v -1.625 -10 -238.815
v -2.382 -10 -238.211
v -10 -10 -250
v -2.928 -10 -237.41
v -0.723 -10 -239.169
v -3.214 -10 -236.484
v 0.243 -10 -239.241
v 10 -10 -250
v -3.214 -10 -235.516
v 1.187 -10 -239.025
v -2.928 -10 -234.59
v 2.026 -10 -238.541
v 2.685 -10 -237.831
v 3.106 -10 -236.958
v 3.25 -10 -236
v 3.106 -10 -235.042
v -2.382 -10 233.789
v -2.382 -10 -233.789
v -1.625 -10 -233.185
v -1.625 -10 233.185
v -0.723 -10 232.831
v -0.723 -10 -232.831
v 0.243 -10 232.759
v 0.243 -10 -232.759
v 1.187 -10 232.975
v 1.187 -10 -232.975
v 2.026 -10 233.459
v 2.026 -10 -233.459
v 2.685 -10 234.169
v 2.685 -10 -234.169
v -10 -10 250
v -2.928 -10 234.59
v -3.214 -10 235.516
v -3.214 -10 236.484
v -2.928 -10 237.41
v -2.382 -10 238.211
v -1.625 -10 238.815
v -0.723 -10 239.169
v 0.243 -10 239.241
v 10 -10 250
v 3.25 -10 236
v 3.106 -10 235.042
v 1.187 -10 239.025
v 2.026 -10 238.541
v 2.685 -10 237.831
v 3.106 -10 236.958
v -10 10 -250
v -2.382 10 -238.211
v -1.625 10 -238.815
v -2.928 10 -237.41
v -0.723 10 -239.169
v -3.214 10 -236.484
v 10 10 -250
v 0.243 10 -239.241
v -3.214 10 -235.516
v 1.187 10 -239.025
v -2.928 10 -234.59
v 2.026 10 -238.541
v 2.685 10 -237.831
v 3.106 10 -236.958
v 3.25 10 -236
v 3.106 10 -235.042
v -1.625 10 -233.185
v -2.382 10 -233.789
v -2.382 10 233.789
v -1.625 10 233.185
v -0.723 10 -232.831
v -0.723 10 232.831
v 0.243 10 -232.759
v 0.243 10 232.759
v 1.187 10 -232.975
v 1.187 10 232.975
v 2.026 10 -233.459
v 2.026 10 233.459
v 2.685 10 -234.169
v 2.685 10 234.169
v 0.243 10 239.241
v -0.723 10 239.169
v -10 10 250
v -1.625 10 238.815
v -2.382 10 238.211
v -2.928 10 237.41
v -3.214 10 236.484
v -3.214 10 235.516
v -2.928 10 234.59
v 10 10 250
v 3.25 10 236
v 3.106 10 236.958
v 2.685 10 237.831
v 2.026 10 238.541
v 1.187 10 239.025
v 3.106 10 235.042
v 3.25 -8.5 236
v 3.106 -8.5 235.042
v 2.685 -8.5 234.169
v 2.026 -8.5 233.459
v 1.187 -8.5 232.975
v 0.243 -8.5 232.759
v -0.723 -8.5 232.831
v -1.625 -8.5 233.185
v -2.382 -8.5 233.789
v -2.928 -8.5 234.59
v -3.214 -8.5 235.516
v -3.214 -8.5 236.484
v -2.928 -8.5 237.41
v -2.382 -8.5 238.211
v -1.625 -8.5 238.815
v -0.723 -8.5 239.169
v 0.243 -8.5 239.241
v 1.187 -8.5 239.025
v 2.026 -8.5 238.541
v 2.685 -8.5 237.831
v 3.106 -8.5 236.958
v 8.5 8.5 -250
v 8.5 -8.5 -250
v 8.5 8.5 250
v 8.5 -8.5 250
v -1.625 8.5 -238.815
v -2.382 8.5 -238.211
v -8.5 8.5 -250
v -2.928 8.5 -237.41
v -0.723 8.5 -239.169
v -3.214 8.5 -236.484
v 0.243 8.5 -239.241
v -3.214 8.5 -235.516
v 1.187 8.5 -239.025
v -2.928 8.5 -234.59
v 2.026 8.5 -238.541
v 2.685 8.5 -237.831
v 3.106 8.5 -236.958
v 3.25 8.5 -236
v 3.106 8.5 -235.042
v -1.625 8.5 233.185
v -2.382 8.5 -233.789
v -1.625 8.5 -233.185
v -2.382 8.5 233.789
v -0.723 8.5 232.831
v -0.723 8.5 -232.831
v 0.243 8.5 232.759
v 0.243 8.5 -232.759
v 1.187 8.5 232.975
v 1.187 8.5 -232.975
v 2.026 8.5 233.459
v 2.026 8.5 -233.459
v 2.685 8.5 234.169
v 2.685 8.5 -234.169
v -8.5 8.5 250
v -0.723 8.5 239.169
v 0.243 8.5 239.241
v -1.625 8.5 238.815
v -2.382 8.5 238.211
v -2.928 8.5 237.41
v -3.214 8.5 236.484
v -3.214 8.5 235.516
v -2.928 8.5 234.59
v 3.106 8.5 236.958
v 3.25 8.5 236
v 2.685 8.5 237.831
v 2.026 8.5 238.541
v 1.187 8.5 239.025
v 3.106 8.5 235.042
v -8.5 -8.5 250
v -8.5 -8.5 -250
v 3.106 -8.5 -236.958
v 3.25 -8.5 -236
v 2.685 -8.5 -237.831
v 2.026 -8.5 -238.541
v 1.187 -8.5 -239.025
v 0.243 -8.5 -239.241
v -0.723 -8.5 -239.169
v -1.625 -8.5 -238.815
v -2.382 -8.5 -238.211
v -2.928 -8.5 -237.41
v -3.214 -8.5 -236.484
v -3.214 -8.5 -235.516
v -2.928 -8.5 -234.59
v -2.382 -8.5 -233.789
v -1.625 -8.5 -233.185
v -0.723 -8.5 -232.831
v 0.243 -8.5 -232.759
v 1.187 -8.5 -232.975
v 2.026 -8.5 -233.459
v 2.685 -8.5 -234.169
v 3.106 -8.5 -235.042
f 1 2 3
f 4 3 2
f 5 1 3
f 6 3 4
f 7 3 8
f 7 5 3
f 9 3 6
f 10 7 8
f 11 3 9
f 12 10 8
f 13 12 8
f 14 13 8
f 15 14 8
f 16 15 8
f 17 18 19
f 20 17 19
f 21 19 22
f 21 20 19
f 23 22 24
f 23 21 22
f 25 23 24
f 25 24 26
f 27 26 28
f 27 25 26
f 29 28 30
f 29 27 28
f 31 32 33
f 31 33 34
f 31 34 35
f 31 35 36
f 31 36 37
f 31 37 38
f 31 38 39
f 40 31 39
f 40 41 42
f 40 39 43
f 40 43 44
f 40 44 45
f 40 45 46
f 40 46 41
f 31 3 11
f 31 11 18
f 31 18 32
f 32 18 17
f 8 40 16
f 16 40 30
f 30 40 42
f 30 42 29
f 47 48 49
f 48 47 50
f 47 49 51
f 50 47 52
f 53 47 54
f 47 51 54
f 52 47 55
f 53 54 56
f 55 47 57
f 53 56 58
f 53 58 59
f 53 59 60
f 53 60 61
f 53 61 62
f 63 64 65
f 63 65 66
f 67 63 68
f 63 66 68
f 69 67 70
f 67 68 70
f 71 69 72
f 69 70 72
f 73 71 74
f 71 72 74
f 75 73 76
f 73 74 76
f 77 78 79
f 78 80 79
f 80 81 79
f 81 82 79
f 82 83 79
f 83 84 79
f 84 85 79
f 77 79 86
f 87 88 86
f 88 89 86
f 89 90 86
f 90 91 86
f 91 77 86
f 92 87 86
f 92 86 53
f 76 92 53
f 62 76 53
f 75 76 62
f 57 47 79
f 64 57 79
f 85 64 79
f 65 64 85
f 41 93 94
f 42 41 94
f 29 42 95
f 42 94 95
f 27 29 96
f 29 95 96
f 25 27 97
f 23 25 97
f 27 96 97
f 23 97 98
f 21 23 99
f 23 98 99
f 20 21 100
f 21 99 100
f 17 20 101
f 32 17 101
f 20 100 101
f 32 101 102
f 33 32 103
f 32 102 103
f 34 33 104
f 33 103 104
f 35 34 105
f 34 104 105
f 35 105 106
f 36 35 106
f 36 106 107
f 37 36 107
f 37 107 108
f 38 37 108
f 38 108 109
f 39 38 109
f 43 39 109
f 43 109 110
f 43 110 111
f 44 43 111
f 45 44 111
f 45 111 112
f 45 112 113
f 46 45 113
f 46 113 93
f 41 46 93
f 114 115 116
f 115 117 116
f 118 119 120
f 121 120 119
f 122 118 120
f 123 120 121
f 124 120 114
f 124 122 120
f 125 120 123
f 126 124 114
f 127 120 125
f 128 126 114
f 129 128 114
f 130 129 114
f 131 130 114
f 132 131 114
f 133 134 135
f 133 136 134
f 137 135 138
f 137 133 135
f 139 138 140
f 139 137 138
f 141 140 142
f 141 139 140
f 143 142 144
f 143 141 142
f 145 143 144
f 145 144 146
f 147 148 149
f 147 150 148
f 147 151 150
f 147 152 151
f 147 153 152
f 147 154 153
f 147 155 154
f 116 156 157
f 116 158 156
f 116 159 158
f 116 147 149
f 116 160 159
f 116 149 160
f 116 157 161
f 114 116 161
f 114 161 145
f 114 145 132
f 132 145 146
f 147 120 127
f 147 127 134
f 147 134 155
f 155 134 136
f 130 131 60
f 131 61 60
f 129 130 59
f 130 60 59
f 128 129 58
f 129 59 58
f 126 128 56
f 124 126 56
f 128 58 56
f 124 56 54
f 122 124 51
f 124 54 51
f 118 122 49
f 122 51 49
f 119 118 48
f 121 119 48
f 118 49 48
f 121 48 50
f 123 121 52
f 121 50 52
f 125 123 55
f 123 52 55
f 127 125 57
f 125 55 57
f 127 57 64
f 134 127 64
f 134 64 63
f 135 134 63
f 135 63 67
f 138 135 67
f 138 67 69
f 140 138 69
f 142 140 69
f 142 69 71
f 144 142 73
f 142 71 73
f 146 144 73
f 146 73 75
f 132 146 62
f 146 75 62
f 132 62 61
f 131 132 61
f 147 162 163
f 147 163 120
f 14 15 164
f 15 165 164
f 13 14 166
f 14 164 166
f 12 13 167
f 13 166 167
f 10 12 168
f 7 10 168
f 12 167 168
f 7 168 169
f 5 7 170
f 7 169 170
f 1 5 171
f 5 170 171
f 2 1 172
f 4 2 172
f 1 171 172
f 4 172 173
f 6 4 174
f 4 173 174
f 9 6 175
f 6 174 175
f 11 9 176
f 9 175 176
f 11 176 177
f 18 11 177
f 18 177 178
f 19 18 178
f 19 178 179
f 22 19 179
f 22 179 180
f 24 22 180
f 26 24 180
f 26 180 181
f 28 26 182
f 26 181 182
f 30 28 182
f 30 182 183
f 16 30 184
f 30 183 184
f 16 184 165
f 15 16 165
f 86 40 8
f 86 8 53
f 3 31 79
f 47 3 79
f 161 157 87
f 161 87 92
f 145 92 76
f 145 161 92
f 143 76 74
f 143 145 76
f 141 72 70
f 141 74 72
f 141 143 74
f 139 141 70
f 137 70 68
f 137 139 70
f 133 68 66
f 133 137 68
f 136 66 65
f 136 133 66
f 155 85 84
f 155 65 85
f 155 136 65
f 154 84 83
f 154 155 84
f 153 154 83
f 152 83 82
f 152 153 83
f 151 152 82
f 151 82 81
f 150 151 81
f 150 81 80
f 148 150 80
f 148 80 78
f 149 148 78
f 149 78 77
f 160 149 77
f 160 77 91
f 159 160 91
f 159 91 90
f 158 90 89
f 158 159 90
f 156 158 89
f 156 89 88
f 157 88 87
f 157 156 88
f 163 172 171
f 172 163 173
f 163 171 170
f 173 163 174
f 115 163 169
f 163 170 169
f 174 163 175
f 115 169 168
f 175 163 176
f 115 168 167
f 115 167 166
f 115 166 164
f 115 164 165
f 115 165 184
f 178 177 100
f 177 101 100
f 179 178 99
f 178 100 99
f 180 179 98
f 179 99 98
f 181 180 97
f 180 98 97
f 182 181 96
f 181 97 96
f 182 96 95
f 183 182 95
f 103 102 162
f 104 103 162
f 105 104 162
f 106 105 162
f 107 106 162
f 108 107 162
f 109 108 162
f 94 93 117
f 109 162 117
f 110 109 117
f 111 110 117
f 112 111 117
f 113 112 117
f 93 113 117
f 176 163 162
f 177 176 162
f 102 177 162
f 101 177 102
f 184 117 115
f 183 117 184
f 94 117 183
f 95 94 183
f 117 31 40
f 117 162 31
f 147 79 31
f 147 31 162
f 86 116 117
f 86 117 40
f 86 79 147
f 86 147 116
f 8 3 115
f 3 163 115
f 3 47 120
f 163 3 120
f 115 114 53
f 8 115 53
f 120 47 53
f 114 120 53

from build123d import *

# Parameters (mm, degrees)
SKIZZE1_W                       = 20
SKIZZE1_H                       = 20
SKIZZE1_W_2                     = 17
SKIZZE1_H_2                     = 17
AUFSATZ_LINEAR_AUSTRAGEN1_DEPTH = 250
SKIZZE2_R                       = 3.25
SCHNITT_LINEAR_AUSTRAGEN1_DEPTH = 15


with BuildPart() as part:
    # Skizze1 → Aufsatz-Linear austragen1 (new, symmetric)
    with BuildSketch(Plane.XY):
        Rectangle(SKIZZE1_W, SKIZZE1_H)
        Rectangle(SKIZZE1_W_2, SKIZZE1_H_2, mode=Mode.SUBTRACT)
    extrude(amount=AUFSATZ_LINEAR_AUSTRAGEN1_DEPTH, both=True)

    # Skizze2 → Schnitt-Linear austragen1 (cut, symmetric)
    with BuildSketch(Plane(origin=(0, 0, 0), x_dir=(1, 0, 0), z_dir=(0, 1, 0))):
        with Locations((0, -236)):
            Circle(SKIZZE2_R)
        with Locations((0, 236)):
            Circle(SKIZZE2_R)
    extrude(amount=SCHNITT_LINEAR_AUSTRAGEN1_DEPTH, both=True, mode=Mode.SUBTRACT)


solid = part.part
